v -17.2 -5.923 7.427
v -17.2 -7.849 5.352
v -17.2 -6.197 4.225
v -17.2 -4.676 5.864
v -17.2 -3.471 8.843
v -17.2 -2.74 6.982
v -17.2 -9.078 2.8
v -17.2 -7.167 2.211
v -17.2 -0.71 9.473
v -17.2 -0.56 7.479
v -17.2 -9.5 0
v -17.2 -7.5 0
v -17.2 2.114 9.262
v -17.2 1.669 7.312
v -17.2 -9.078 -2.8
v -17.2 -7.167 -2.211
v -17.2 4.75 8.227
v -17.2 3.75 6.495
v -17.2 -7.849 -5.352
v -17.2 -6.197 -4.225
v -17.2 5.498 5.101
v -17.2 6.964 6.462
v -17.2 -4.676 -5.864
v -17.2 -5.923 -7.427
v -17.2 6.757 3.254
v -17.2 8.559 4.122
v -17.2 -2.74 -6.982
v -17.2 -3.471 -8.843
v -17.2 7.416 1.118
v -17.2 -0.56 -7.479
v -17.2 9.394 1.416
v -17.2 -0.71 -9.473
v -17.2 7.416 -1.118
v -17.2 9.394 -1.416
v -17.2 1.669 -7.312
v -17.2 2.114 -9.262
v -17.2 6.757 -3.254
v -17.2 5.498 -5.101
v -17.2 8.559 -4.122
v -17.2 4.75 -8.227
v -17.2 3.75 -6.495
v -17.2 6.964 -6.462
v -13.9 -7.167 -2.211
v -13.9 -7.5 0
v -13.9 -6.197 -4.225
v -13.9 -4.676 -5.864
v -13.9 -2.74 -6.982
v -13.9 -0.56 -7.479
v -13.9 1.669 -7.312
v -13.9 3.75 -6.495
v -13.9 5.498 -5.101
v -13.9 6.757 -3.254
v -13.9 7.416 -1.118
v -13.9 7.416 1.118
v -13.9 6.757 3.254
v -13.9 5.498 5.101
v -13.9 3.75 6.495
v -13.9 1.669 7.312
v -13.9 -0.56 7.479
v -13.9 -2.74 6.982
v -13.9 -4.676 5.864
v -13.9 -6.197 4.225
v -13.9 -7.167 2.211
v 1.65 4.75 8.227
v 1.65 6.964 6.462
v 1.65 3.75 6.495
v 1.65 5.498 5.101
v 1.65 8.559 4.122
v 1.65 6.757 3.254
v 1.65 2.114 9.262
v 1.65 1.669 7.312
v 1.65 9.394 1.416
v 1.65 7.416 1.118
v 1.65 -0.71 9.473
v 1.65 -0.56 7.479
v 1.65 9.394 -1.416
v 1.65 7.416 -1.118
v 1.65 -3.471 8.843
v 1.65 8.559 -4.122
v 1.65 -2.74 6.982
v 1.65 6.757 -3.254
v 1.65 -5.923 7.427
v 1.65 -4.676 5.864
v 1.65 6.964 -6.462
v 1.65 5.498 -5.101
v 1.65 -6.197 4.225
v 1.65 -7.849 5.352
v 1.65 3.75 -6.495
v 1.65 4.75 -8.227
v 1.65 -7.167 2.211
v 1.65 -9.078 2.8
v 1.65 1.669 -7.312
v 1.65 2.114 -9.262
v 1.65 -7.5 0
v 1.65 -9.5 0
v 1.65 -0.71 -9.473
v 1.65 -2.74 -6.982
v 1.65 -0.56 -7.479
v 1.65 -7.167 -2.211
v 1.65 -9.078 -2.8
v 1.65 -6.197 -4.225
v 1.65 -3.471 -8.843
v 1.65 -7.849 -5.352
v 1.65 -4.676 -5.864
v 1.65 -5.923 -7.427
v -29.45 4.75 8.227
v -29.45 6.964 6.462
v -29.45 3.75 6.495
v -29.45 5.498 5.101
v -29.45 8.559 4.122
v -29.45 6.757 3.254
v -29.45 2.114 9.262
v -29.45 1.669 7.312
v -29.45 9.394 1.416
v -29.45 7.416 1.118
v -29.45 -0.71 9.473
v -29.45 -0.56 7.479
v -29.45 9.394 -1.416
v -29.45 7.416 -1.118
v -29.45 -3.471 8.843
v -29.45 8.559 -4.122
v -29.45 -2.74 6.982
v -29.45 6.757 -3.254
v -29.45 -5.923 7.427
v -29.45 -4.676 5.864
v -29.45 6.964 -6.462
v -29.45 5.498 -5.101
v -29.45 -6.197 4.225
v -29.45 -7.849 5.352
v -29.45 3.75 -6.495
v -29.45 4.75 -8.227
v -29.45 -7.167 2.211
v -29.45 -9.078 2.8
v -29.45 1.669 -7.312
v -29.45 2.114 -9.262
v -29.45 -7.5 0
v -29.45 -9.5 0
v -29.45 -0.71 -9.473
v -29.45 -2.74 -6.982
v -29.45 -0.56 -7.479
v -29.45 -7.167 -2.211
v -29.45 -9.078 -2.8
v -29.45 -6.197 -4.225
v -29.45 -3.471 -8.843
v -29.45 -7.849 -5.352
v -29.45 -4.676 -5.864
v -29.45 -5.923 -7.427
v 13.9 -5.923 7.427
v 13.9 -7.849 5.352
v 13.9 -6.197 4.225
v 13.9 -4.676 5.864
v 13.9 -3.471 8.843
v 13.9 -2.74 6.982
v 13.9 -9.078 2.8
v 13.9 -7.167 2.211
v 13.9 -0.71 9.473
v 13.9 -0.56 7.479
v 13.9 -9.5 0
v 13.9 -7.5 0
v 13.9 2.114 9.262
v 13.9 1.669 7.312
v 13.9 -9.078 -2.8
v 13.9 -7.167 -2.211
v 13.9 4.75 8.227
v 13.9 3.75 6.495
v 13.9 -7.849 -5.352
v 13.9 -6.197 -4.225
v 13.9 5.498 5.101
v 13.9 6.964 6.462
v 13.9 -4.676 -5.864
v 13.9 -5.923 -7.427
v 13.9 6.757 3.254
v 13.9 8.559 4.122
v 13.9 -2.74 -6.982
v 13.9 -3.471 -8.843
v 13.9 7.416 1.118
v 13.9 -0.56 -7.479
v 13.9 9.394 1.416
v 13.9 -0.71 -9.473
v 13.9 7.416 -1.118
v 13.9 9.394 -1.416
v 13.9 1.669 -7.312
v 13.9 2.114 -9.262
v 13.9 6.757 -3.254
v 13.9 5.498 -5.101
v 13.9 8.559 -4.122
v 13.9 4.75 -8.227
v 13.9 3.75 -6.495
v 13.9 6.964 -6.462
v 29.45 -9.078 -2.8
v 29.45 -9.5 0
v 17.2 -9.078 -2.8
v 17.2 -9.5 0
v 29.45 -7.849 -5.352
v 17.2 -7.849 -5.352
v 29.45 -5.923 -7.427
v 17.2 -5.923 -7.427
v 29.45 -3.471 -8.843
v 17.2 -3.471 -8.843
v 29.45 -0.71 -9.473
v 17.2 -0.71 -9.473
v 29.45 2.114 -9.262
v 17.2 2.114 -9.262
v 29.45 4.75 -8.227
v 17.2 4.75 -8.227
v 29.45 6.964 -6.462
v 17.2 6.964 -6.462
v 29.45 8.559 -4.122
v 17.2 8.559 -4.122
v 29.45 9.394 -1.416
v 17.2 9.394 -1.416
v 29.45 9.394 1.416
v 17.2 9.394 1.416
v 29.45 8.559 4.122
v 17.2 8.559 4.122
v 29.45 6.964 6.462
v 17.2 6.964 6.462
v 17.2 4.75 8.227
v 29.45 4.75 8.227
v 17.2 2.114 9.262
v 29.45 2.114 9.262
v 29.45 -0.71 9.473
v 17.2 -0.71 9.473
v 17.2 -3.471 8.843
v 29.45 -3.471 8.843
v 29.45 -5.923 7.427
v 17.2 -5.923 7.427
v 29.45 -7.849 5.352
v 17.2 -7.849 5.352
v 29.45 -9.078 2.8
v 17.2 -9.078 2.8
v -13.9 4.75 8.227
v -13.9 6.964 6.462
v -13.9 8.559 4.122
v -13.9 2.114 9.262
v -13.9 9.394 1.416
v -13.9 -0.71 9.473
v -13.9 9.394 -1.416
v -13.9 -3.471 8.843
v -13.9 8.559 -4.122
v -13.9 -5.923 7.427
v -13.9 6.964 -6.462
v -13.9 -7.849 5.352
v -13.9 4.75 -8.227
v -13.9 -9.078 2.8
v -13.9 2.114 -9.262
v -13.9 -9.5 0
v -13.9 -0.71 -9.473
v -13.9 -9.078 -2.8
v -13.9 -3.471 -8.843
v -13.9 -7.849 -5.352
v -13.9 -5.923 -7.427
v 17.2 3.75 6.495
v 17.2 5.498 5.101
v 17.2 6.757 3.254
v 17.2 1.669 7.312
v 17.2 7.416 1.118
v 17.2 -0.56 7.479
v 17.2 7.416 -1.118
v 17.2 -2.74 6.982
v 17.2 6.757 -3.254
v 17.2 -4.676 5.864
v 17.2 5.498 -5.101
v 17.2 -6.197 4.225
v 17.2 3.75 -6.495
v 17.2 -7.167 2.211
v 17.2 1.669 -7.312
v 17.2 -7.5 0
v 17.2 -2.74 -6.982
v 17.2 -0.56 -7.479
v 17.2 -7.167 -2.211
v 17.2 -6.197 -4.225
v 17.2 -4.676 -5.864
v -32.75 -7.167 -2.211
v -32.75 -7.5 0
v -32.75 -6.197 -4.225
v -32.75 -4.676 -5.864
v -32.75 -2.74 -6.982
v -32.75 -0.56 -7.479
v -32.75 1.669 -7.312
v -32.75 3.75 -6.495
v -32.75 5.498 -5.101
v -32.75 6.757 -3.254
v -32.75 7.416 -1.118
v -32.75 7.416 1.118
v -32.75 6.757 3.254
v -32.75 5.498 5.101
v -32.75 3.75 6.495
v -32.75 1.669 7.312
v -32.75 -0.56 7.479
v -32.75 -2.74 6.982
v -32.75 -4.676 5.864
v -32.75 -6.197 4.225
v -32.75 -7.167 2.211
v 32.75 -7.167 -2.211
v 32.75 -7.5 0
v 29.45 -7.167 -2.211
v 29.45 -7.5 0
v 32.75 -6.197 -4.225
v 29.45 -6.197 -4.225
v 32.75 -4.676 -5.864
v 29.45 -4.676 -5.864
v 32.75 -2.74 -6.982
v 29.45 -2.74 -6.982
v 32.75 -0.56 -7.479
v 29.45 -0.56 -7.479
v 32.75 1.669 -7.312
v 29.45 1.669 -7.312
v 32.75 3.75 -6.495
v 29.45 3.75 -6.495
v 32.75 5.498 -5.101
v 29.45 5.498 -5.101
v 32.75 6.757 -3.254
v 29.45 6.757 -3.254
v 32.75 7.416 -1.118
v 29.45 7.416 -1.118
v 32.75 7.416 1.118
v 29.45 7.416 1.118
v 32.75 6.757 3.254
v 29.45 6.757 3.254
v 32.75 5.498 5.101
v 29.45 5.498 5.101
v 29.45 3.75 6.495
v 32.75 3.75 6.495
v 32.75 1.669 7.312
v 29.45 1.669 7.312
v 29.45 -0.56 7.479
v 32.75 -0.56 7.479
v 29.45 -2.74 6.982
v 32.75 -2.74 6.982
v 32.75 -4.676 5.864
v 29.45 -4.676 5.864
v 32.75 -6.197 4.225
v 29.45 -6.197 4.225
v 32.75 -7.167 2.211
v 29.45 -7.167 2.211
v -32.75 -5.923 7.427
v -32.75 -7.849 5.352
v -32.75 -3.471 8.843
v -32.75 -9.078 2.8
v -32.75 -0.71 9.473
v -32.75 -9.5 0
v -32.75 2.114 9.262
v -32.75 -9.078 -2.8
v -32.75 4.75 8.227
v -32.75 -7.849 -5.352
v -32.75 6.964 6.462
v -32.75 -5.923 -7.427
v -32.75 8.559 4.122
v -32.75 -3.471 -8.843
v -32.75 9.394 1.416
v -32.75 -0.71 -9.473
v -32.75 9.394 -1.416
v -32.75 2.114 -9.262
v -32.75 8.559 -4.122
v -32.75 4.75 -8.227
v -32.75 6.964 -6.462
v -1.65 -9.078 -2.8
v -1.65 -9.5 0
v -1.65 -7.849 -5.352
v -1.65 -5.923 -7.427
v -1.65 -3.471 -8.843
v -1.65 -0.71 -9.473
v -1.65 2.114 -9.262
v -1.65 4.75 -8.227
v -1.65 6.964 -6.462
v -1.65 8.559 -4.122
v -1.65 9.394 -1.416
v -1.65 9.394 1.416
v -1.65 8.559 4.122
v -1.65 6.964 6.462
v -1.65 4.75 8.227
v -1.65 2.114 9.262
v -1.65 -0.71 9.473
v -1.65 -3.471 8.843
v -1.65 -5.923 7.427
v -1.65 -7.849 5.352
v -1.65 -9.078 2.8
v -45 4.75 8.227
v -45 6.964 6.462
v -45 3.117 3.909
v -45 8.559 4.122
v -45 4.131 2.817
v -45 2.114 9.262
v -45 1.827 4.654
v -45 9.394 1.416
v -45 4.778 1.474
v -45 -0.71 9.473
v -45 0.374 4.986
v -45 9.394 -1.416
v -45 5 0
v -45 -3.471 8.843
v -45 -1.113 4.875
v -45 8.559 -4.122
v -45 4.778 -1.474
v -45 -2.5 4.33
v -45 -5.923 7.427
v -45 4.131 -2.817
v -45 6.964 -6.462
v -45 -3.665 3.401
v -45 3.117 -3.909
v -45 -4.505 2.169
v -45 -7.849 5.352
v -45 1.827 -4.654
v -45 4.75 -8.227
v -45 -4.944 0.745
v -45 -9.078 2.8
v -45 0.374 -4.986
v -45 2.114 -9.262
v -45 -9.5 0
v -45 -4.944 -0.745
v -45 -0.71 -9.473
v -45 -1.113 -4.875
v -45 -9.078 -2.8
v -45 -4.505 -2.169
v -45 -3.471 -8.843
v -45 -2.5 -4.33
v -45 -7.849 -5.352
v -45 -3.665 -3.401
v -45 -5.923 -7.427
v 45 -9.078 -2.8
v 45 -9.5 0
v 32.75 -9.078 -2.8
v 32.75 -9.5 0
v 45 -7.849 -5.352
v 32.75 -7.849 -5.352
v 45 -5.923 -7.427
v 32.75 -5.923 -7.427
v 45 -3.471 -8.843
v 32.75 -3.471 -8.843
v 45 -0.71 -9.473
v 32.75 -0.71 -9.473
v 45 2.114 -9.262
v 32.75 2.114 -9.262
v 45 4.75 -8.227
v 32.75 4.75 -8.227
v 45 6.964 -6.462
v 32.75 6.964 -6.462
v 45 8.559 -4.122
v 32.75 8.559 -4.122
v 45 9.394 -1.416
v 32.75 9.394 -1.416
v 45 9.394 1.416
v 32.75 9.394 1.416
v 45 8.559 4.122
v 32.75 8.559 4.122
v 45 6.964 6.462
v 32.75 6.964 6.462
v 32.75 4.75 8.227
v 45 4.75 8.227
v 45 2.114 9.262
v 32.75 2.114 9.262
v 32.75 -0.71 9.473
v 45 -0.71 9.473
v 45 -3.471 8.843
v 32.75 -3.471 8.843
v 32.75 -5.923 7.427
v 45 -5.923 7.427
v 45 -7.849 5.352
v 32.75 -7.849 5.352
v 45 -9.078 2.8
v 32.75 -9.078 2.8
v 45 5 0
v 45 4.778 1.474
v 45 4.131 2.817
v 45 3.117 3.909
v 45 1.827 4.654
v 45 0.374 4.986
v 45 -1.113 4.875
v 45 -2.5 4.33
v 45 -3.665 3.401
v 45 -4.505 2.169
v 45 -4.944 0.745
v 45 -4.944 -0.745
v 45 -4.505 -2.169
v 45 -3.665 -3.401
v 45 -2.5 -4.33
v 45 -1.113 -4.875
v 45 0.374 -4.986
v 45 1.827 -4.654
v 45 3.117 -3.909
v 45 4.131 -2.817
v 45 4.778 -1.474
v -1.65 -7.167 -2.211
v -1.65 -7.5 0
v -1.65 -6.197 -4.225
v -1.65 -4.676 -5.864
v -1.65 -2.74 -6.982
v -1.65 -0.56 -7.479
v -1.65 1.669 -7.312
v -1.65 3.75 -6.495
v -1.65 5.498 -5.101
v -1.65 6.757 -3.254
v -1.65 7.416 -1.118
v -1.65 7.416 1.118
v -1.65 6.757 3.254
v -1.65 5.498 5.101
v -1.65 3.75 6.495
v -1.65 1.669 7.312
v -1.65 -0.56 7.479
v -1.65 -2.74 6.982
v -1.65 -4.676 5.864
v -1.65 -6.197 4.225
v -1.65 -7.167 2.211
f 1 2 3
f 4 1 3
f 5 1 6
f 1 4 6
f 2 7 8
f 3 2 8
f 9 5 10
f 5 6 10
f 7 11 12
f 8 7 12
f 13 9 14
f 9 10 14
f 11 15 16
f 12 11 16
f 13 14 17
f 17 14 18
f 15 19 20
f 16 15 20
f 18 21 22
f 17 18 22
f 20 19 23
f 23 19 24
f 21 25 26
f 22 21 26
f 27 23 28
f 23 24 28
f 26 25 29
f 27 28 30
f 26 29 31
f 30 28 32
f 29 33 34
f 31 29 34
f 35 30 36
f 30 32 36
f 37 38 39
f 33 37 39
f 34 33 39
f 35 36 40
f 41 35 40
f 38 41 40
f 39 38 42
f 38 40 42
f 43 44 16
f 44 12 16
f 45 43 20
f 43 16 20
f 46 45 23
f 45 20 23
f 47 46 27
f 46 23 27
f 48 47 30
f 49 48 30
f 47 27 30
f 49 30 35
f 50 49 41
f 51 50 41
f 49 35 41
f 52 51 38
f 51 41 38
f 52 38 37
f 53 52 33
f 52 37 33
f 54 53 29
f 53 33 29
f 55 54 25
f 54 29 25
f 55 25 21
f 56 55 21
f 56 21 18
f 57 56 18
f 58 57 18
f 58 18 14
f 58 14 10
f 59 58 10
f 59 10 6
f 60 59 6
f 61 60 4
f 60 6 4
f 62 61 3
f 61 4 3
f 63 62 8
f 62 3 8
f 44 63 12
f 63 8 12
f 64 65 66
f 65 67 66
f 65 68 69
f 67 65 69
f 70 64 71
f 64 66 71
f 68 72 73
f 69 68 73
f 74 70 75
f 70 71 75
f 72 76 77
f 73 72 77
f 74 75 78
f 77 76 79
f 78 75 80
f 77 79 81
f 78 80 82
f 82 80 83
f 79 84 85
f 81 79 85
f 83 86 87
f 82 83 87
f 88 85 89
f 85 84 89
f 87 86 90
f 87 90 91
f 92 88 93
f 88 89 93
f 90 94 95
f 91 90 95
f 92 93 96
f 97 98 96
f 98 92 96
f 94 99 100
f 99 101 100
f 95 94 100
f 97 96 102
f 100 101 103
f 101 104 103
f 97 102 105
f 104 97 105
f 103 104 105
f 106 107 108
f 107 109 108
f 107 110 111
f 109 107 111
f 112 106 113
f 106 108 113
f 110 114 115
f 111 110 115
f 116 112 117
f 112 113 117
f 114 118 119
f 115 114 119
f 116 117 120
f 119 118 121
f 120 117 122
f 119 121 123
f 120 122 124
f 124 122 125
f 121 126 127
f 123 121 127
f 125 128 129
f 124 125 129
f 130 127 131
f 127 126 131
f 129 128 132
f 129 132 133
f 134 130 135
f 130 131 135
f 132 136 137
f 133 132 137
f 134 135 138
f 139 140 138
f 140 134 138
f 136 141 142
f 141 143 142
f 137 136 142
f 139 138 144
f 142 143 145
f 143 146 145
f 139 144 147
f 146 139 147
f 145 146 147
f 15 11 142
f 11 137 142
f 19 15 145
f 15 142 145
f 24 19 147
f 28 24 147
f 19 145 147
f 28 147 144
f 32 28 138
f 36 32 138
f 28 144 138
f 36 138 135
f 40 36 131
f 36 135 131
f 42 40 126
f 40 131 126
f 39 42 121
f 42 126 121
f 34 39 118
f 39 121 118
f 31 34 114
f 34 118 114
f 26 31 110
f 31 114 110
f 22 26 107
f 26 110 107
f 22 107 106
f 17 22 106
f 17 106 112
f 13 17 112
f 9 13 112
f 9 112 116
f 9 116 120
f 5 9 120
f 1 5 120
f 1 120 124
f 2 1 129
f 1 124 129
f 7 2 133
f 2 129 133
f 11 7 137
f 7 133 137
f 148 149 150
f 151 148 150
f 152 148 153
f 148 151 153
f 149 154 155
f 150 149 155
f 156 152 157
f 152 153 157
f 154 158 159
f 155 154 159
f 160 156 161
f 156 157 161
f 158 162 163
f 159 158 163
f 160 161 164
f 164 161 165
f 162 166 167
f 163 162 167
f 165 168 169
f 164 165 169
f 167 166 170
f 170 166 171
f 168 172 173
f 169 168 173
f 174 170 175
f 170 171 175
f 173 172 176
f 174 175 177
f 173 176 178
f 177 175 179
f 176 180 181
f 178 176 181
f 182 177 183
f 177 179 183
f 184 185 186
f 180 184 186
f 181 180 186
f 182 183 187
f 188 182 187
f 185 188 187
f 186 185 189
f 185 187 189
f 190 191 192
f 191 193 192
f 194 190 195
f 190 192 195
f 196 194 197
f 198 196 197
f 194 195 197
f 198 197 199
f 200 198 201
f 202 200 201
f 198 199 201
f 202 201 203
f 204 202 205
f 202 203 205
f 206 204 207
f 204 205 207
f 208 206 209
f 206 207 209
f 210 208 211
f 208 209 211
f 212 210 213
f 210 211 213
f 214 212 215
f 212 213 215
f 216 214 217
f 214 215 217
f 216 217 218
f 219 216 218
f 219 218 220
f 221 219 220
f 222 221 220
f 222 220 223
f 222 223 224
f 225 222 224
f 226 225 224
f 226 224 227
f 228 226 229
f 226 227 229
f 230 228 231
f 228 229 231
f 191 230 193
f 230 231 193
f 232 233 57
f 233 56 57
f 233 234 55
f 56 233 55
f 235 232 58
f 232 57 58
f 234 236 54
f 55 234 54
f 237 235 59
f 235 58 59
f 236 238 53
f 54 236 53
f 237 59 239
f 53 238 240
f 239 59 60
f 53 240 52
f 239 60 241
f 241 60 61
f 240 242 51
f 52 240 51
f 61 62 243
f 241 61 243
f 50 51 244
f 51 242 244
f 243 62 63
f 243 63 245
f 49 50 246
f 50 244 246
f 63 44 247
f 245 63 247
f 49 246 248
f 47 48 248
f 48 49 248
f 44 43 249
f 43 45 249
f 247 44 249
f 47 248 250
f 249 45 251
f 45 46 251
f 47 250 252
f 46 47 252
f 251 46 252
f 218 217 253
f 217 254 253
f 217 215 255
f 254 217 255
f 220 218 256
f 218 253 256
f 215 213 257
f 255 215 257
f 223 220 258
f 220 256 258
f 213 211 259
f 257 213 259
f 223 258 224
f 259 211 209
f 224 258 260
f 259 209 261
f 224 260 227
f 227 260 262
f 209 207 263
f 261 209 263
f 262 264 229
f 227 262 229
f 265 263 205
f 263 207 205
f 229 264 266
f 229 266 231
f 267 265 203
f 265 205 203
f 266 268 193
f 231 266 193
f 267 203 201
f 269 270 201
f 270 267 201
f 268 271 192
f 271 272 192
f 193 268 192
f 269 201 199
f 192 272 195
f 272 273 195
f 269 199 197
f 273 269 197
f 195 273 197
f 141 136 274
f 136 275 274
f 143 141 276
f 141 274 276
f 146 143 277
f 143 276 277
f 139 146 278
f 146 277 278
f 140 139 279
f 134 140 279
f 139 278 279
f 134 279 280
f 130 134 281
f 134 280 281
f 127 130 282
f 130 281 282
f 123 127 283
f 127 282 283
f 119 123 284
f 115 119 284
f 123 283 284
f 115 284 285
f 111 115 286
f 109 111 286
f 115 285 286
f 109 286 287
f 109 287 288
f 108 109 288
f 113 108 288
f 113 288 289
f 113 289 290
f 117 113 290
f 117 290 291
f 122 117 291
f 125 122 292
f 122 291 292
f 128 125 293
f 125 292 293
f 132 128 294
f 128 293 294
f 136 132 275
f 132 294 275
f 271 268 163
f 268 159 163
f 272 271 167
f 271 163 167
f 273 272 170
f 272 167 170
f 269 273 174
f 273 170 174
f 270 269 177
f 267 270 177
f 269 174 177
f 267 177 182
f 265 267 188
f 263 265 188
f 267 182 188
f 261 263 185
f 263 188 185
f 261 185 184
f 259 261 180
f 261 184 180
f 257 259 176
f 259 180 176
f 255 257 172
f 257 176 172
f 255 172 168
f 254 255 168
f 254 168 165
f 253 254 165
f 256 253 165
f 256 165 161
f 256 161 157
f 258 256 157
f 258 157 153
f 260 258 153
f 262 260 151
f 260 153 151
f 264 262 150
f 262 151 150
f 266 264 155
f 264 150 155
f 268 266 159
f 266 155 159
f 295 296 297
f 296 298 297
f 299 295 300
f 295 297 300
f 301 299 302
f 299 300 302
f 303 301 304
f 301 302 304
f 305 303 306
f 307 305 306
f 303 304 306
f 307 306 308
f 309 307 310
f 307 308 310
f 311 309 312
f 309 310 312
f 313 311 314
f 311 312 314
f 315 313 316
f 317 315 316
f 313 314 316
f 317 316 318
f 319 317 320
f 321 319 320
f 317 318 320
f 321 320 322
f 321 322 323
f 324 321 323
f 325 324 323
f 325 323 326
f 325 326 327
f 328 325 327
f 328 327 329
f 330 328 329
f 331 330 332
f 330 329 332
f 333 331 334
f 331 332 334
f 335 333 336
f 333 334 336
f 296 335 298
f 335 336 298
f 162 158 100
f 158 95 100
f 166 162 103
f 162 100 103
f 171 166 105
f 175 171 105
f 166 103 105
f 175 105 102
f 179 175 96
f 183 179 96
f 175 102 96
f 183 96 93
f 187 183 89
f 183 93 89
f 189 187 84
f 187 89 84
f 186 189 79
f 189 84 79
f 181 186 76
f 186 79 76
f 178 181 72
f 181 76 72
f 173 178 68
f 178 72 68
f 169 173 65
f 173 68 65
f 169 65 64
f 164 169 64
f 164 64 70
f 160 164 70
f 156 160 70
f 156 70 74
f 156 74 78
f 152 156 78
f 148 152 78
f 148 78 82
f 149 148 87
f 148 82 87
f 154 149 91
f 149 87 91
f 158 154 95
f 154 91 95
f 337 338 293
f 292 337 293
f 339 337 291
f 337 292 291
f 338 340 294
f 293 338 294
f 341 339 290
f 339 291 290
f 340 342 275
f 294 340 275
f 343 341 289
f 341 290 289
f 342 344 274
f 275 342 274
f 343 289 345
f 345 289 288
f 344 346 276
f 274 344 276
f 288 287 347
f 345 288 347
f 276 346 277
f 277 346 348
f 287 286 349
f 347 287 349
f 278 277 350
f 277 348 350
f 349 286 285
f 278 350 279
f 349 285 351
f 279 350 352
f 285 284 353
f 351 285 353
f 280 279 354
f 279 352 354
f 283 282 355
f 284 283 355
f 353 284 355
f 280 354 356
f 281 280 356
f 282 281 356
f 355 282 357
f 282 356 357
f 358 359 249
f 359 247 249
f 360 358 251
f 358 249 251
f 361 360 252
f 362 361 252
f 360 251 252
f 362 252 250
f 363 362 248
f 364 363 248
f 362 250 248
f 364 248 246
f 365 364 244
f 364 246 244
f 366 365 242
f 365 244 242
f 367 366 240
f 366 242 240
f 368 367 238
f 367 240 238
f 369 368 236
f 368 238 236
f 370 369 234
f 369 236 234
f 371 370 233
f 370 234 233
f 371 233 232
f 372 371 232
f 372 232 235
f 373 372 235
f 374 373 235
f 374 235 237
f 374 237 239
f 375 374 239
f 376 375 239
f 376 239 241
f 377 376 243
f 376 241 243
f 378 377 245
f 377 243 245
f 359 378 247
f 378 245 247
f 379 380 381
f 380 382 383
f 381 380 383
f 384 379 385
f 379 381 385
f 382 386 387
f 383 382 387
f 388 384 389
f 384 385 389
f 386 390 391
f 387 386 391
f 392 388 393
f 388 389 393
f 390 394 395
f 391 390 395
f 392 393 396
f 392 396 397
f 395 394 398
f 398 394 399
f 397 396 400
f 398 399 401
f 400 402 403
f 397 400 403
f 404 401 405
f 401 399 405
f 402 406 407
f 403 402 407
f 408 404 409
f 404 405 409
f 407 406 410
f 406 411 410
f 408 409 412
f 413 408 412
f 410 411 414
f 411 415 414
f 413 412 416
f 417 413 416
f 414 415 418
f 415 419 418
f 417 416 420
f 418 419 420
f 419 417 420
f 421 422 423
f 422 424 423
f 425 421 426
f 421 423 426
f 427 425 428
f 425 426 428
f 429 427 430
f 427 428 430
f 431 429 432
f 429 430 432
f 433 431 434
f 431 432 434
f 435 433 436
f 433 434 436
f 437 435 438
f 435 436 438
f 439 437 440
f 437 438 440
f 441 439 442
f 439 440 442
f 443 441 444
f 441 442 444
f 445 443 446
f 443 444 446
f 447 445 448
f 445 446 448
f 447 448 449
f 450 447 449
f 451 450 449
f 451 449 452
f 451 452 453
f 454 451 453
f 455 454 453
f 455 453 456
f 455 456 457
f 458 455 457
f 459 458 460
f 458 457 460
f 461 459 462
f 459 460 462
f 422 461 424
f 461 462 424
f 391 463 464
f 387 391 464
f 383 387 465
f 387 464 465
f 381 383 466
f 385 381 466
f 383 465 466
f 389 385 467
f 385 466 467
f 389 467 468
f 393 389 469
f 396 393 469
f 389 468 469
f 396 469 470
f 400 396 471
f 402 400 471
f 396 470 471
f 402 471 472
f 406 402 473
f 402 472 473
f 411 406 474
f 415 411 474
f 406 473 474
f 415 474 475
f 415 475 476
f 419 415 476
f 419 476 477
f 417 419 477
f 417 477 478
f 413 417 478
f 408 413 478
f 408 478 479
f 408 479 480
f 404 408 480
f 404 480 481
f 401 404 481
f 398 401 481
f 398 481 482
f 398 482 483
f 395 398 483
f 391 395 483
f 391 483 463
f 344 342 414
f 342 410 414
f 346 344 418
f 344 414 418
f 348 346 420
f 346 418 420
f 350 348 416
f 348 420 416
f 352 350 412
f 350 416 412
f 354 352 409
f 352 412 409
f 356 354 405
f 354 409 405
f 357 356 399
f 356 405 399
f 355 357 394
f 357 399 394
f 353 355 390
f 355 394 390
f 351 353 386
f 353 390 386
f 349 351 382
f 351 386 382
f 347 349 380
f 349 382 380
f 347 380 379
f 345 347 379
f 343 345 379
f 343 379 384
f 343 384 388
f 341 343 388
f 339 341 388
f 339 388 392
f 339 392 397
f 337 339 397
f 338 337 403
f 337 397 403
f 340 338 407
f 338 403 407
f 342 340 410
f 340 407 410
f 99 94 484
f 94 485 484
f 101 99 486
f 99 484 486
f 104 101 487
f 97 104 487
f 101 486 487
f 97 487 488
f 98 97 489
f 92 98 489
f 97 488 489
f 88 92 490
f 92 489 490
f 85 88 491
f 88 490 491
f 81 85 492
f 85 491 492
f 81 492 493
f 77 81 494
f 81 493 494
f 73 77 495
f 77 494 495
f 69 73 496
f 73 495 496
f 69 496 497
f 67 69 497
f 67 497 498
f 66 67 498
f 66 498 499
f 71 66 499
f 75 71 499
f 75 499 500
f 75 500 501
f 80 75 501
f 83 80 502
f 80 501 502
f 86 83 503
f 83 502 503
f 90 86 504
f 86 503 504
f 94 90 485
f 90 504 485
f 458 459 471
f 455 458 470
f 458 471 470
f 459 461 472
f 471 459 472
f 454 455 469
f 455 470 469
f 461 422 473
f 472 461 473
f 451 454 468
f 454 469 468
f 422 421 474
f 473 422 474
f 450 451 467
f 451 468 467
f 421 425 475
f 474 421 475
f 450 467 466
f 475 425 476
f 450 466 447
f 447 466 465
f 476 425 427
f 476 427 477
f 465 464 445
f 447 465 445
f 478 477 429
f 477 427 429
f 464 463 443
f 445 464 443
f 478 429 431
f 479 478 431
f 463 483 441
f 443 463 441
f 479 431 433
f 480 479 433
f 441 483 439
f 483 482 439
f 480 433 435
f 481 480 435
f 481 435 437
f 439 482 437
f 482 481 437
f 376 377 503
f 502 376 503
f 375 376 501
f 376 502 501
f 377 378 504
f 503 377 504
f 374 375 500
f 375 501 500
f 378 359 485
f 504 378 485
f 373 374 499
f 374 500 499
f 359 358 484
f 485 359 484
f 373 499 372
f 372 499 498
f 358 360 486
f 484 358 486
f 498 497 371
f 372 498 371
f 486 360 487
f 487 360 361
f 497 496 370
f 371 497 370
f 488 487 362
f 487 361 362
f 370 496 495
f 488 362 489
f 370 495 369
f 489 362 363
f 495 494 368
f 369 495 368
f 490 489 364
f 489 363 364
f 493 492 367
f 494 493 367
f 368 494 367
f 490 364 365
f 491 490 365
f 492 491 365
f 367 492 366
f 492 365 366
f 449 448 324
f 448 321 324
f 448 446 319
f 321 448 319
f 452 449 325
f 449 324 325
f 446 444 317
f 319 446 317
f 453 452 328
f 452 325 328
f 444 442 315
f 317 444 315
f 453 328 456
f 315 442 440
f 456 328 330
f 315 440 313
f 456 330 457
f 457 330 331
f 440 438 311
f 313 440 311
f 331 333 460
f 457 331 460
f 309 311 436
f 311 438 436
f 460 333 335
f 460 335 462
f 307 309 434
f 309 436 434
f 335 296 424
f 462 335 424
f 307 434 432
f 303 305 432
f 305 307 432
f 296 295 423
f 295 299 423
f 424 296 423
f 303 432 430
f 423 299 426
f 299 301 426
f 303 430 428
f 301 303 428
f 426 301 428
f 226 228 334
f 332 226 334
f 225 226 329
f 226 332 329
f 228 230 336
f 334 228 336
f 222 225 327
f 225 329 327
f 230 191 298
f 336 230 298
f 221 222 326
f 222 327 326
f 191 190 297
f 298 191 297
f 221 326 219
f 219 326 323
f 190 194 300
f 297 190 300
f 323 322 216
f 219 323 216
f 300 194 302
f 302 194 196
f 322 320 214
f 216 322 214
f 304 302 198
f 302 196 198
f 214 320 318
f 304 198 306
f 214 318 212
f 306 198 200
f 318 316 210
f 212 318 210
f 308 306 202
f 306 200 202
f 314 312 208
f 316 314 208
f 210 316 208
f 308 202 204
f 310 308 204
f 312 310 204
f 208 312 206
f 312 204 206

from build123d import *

# Parameters (mm, degrees)
SKETCH2_R          = 5
CUT_EXTRUDE1_DEPTH = 91.997252706


with BuildPart() as part:
    # Sketch1 → Revolve1 (revolve)
    with BuildSketch(Plane.XY, mode=Mode.PRIVATE) as revolve1_sk:
        Polygon((-45, 0), (45, 0), (45, 9.5), (32.75, 9.5), (32.75, 7.5), (29.45, 7.5), (29.45, 9.5), (17.2, 9.5), (17.2, 7.5), (13.9, 7.5), (13.9, 9.5), (1.65, 9.5), (1.65, 7.5), (-1.65, 7.5), (-1.65, 9.5), (-13.9, 9.5), (-13.9, 7.5), (-17.2, 7.5), (-17.2, 9.5), (-29.45, 9.5), (-29.45, 7.5), (-32.75, 7.5), (-32.75, 9.5), (-45, 9.5), align=None)
    revolve(revolve1_sk.sketch.rotate(Axis((-45, 0, 0), (1, 0, 0)), 180), axis=Axis((-45, 0, 0), (1, 0, 0)))

    # Sketch2 → Cut-Extrude1 (cut, through all)
    with BuildSketch(Plane(origin=(45, 0, 0), x_dir=(0, 0, -1), z_dir=(1, 0, 0))):
        with Locations(Location((0, 0, 0), (0, 0, 90))):
            Circle(SKETCH2_R)
    extrude(amount=-CUT_EXTRUDE1_DEPTH, mode=Mode.SUBTRACT)


solid = part.part
